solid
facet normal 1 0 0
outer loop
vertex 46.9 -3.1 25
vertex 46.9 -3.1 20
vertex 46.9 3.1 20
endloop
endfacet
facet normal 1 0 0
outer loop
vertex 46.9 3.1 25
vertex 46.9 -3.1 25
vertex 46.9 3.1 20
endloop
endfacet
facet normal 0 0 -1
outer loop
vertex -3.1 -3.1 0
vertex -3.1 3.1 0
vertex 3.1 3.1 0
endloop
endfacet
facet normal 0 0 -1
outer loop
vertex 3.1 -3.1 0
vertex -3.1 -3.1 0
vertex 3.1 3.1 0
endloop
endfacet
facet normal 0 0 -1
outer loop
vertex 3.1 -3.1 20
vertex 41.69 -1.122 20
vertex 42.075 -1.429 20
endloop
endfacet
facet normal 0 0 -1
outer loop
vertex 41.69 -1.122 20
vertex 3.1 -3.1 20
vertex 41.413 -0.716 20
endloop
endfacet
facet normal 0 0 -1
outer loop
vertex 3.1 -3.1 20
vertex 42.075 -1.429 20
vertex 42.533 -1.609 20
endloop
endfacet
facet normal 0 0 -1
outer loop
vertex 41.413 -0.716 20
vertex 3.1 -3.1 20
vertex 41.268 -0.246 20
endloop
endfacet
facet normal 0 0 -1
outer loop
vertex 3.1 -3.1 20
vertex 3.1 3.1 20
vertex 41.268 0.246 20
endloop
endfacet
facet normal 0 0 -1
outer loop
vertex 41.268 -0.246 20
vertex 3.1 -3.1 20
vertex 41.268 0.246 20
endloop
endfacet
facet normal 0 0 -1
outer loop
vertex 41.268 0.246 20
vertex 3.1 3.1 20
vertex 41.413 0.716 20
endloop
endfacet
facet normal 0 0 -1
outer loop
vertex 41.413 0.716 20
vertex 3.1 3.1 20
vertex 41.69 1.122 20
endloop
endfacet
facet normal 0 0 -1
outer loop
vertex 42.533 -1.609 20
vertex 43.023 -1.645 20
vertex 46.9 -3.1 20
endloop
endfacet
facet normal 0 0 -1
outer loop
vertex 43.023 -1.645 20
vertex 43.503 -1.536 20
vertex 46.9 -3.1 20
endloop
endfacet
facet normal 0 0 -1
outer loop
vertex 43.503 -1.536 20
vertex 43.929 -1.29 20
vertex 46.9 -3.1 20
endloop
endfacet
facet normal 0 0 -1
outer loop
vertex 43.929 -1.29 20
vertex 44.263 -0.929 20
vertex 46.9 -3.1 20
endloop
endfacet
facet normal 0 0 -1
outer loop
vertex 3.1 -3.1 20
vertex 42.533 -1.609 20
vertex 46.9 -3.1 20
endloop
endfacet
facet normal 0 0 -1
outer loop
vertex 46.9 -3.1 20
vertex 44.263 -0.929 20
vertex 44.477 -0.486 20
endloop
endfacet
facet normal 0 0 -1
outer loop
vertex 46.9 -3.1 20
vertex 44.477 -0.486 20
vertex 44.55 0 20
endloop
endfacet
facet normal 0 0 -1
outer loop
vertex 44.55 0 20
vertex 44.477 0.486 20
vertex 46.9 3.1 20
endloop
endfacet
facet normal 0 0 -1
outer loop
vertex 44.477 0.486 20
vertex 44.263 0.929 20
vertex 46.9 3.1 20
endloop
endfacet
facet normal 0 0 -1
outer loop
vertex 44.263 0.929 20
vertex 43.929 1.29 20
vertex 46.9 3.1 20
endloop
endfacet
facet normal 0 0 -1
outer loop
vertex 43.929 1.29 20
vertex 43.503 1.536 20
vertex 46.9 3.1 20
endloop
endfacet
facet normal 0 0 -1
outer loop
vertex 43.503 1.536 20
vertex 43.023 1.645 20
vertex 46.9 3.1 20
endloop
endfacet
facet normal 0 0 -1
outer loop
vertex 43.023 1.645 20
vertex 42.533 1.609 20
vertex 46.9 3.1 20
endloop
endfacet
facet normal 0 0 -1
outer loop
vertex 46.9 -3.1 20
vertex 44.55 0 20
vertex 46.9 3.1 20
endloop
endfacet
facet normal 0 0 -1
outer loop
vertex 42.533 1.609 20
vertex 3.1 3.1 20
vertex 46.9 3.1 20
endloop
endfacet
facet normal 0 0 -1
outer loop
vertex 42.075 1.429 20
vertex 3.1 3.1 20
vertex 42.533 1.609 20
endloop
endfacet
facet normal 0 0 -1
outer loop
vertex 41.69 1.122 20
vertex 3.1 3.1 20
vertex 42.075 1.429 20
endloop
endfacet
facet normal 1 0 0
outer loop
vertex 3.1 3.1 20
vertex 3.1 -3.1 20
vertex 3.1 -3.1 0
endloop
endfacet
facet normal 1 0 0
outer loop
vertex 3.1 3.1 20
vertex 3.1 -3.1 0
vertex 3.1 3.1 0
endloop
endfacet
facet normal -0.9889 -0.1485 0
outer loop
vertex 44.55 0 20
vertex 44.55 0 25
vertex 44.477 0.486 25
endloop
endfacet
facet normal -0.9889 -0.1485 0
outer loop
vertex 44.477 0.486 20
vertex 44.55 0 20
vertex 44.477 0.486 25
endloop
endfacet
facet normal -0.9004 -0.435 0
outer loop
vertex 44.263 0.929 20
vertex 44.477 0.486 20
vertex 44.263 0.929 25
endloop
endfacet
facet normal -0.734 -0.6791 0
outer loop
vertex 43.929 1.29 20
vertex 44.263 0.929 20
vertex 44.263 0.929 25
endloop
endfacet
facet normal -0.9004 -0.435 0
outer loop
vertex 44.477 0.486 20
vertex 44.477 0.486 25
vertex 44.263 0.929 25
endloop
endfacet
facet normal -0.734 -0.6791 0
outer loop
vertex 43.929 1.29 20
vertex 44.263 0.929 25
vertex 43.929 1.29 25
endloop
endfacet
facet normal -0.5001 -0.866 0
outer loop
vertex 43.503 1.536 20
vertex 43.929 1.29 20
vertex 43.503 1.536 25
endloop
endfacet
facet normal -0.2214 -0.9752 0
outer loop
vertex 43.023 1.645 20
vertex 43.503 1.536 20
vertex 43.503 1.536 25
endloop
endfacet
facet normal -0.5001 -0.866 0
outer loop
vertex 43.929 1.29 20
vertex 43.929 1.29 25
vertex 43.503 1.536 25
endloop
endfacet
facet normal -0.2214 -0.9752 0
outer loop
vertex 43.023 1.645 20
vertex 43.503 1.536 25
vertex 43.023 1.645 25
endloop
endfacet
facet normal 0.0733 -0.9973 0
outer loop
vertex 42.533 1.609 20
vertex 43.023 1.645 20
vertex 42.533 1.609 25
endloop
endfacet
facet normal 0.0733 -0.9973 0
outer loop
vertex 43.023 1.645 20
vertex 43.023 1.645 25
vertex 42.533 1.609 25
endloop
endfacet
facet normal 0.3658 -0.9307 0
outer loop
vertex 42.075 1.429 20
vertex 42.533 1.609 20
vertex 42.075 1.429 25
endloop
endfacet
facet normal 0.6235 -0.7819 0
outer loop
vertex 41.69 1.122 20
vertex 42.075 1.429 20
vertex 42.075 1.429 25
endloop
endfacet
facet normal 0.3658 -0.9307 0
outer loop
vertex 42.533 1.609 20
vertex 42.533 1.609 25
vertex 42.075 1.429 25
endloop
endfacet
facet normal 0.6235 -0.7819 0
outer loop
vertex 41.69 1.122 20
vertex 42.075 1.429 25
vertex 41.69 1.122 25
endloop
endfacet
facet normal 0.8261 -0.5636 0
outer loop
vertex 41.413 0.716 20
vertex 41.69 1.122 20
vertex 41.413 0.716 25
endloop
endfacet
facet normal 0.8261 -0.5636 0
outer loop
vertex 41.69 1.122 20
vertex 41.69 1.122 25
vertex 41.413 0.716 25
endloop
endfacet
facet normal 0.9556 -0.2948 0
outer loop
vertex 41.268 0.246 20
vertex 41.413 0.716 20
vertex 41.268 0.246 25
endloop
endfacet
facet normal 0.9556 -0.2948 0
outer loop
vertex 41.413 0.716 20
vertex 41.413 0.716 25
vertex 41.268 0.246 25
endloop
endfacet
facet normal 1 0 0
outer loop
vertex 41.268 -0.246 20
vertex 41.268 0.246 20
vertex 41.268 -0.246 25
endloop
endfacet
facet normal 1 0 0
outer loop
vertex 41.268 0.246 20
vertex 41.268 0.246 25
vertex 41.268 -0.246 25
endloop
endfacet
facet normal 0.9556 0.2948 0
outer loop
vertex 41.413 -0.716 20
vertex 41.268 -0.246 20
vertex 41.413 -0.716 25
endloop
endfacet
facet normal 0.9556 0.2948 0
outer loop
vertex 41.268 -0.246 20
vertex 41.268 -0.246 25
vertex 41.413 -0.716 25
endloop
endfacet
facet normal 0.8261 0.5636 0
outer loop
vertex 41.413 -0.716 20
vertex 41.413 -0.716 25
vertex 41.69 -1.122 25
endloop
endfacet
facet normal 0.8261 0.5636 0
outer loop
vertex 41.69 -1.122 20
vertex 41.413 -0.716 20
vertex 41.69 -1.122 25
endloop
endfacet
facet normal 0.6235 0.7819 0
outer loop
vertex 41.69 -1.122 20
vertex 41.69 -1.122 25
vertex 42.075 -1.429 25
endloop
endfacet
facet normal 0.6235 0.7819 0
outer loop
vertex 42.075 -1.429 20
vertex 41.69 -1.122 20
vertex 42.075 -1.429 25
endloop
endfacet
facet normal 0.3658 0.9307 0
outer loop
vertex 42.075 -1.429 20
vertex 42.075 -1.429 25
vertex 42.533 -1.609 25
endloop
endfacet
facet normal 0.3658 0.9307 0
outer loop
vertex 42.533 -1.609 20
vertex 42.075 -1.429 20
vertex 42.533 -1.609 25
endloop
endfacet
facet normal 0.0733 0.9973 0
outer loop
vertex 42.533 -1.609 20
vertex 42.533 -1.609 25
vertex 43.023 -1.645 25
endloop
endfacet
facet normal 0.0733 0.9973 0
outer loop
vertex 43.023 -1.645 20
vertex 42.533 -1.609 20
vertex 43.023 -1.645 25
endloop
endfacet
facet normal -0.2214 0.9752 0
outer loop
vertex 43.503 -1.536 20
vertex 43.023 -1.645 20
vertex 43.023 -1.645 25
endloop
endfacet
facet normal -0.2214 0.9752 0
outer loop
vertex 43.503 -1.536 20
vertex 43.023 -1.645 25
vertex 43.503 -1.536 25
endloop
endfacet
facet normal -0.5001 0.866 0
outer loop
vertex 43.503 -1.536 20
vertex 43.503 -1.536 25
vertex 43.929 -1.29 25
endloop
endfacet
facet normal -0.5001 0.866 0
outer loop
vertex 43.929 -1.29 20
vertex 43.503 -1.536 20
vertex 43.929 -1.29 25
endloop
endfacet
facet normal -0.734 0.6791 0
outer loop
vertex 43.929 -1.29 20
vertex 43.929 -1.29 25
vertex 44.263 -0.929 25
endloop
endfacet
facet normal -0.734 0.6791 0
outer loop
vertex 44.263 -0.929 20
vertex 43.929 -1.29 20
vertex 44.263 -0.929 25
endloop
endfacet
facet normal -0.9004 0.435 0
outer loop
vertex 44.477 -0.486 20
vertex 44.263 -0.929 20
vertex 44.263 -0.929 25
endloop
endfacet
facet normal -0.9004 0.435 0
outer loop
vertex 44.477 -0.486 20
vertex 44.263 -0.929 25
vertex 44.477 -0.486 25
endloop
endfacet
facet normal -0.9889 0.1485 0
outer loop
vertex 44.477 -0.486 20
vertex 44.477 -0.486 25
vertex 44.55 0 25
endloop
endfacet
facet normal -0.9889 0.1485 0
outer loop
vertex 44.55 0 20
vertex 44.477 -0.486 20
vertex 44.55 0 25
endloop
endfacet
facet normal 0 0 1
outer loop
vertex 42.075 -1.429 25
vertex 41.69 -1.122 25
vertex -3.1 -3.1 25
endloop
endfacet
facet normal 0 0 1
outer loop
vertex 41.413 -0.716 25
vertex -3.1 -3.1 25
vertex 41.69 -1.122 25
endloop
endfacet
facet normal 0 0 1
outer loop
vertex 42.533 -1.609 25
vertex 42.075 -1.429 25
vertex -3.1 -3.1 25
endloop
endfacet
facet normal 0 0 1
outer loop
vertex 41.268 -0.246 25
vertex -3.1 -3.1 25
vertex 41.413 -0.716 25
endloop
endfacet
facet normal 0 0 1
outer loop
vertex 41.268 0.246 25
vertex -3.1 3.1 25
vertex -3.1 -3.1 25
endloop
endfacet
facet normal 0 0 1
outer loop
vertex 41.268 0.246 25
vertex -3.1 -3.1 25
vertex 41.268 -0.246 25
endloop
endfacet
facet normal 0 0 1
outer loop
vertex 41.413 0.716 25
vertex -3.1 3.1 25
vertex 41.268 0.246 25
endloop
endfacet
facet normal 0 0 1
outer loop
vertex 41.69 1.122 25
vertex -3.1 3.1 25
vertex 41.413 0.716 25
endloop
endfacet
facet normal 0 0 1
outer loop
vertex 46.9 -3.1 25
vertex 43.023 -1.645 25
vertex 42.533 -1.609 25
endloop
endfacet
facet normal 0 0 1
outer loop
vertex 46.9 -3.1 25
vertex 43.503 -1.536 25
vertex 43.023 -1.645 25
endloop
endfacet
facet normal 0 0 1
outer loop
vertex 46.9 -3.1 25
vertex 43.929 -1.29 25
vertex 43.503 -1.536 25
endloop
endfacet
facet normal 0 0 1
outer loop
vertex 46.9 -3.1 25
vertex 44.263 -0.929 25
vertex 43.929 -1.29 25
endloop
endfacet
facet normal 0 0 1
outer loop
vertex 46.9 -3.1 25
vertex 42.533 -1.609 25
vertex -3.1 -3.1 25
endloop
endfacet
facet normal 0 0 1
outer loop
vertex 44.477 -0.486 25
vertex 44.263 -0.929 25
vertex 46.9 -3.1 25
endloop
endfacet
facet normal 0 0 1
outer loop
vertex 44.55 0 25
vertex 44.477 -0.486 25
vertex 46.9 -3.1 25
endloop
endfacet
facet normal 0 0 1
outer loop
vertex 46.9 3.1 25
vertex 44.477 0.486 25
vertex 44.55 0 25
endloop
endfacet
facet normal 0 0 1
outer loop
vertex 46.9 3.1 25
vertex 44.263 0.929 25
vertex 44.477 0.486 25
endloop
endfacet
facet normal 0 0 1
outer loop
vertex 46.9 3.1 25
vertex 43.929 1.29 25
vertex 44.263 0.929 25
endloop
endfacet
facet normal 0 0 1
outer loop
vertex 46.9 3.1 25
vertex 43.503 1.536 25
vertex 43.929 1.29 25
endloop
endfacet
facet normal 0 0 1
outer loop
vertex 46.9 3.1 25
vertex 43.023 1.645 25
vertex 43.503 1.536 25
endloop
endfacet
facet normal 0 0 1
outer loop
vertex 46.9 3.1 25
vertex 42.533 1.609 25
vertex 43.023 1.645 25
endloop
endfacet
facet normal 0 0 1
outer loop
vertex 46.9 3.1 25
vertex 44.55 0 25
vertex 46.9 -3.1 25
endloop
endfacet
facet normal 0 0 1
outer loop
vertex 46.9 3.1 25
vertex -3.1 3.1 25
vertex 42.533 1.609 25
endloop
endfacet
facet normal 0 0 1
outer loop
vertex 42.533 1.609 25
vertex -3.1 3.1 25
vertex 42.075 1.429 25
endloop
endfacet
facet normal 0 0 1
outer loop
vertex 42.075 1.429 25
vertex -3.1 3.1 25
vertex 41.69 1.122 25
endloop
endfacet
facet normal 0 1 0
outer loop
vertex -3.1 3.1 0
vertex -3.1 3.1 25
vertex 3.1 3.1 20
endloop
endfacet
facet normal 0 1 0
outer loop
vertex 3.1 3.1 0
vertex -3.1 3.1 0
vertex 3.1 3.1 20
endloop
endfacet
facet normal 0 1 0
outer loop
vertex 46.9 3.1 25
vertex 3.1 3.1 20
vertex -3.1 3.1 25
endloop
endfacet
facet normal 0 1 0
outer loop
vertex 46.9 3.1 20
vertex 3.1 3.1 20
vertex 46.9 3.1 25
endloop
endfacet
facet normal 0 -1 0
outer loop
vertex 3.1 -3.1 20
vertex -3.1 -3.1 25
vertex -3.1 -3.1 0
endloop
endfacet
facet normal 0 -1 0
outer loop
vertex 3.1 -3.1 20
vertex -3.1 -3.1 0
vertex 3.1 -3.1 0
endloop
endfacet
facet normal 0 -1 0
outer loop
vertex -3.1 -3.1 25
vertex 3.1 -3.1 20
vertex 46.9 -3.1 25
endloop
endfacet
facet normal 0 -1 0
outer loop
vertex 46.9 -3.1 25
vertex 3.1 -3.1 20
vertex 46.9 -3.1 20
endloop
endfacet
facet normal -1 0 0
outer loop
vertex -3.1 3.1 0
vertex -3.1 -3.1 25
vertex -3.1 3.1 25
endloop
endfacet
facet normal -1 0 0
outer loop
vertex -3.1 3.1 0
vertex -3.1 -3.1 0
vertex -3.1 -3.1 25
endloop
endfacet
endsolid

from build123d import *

# Parameters (mm, degrees)
F0_W     = 6.2
F0_H     = 6.2
F1_DEPTH = 20
F2_W     = 50
F2_H     = 6.2
F3_DEPTH = 5
F4_R     = 1.65
F5_DEPTH = 25


with BuildPart() as f1:
    # F0 (on Top) → F1 (new body)
    with BuildSketch(Plane.XY):
        Rectangle(F0_W, F0_H)
    extrude(amount=F1_DEPTH)

    # F2 (on face) → F3 (join)
    with BuildSketch(Plane.XY.offset(20)):
        with Locations((21.9, 0)):
            Rectangle(F2_W, F2_H)
    extrude(amount=F3_DEPTH)

    # F4 (on face) → F5 (cut)
    with BuildSketch(Plane.XY.offset(25)):
        with Locations((42.9, 0)):
            Circle(F4_R)
    extrude(amount=-F5_DEPTH, mode=Mode.SUBTRACT)


solid = f1.part
